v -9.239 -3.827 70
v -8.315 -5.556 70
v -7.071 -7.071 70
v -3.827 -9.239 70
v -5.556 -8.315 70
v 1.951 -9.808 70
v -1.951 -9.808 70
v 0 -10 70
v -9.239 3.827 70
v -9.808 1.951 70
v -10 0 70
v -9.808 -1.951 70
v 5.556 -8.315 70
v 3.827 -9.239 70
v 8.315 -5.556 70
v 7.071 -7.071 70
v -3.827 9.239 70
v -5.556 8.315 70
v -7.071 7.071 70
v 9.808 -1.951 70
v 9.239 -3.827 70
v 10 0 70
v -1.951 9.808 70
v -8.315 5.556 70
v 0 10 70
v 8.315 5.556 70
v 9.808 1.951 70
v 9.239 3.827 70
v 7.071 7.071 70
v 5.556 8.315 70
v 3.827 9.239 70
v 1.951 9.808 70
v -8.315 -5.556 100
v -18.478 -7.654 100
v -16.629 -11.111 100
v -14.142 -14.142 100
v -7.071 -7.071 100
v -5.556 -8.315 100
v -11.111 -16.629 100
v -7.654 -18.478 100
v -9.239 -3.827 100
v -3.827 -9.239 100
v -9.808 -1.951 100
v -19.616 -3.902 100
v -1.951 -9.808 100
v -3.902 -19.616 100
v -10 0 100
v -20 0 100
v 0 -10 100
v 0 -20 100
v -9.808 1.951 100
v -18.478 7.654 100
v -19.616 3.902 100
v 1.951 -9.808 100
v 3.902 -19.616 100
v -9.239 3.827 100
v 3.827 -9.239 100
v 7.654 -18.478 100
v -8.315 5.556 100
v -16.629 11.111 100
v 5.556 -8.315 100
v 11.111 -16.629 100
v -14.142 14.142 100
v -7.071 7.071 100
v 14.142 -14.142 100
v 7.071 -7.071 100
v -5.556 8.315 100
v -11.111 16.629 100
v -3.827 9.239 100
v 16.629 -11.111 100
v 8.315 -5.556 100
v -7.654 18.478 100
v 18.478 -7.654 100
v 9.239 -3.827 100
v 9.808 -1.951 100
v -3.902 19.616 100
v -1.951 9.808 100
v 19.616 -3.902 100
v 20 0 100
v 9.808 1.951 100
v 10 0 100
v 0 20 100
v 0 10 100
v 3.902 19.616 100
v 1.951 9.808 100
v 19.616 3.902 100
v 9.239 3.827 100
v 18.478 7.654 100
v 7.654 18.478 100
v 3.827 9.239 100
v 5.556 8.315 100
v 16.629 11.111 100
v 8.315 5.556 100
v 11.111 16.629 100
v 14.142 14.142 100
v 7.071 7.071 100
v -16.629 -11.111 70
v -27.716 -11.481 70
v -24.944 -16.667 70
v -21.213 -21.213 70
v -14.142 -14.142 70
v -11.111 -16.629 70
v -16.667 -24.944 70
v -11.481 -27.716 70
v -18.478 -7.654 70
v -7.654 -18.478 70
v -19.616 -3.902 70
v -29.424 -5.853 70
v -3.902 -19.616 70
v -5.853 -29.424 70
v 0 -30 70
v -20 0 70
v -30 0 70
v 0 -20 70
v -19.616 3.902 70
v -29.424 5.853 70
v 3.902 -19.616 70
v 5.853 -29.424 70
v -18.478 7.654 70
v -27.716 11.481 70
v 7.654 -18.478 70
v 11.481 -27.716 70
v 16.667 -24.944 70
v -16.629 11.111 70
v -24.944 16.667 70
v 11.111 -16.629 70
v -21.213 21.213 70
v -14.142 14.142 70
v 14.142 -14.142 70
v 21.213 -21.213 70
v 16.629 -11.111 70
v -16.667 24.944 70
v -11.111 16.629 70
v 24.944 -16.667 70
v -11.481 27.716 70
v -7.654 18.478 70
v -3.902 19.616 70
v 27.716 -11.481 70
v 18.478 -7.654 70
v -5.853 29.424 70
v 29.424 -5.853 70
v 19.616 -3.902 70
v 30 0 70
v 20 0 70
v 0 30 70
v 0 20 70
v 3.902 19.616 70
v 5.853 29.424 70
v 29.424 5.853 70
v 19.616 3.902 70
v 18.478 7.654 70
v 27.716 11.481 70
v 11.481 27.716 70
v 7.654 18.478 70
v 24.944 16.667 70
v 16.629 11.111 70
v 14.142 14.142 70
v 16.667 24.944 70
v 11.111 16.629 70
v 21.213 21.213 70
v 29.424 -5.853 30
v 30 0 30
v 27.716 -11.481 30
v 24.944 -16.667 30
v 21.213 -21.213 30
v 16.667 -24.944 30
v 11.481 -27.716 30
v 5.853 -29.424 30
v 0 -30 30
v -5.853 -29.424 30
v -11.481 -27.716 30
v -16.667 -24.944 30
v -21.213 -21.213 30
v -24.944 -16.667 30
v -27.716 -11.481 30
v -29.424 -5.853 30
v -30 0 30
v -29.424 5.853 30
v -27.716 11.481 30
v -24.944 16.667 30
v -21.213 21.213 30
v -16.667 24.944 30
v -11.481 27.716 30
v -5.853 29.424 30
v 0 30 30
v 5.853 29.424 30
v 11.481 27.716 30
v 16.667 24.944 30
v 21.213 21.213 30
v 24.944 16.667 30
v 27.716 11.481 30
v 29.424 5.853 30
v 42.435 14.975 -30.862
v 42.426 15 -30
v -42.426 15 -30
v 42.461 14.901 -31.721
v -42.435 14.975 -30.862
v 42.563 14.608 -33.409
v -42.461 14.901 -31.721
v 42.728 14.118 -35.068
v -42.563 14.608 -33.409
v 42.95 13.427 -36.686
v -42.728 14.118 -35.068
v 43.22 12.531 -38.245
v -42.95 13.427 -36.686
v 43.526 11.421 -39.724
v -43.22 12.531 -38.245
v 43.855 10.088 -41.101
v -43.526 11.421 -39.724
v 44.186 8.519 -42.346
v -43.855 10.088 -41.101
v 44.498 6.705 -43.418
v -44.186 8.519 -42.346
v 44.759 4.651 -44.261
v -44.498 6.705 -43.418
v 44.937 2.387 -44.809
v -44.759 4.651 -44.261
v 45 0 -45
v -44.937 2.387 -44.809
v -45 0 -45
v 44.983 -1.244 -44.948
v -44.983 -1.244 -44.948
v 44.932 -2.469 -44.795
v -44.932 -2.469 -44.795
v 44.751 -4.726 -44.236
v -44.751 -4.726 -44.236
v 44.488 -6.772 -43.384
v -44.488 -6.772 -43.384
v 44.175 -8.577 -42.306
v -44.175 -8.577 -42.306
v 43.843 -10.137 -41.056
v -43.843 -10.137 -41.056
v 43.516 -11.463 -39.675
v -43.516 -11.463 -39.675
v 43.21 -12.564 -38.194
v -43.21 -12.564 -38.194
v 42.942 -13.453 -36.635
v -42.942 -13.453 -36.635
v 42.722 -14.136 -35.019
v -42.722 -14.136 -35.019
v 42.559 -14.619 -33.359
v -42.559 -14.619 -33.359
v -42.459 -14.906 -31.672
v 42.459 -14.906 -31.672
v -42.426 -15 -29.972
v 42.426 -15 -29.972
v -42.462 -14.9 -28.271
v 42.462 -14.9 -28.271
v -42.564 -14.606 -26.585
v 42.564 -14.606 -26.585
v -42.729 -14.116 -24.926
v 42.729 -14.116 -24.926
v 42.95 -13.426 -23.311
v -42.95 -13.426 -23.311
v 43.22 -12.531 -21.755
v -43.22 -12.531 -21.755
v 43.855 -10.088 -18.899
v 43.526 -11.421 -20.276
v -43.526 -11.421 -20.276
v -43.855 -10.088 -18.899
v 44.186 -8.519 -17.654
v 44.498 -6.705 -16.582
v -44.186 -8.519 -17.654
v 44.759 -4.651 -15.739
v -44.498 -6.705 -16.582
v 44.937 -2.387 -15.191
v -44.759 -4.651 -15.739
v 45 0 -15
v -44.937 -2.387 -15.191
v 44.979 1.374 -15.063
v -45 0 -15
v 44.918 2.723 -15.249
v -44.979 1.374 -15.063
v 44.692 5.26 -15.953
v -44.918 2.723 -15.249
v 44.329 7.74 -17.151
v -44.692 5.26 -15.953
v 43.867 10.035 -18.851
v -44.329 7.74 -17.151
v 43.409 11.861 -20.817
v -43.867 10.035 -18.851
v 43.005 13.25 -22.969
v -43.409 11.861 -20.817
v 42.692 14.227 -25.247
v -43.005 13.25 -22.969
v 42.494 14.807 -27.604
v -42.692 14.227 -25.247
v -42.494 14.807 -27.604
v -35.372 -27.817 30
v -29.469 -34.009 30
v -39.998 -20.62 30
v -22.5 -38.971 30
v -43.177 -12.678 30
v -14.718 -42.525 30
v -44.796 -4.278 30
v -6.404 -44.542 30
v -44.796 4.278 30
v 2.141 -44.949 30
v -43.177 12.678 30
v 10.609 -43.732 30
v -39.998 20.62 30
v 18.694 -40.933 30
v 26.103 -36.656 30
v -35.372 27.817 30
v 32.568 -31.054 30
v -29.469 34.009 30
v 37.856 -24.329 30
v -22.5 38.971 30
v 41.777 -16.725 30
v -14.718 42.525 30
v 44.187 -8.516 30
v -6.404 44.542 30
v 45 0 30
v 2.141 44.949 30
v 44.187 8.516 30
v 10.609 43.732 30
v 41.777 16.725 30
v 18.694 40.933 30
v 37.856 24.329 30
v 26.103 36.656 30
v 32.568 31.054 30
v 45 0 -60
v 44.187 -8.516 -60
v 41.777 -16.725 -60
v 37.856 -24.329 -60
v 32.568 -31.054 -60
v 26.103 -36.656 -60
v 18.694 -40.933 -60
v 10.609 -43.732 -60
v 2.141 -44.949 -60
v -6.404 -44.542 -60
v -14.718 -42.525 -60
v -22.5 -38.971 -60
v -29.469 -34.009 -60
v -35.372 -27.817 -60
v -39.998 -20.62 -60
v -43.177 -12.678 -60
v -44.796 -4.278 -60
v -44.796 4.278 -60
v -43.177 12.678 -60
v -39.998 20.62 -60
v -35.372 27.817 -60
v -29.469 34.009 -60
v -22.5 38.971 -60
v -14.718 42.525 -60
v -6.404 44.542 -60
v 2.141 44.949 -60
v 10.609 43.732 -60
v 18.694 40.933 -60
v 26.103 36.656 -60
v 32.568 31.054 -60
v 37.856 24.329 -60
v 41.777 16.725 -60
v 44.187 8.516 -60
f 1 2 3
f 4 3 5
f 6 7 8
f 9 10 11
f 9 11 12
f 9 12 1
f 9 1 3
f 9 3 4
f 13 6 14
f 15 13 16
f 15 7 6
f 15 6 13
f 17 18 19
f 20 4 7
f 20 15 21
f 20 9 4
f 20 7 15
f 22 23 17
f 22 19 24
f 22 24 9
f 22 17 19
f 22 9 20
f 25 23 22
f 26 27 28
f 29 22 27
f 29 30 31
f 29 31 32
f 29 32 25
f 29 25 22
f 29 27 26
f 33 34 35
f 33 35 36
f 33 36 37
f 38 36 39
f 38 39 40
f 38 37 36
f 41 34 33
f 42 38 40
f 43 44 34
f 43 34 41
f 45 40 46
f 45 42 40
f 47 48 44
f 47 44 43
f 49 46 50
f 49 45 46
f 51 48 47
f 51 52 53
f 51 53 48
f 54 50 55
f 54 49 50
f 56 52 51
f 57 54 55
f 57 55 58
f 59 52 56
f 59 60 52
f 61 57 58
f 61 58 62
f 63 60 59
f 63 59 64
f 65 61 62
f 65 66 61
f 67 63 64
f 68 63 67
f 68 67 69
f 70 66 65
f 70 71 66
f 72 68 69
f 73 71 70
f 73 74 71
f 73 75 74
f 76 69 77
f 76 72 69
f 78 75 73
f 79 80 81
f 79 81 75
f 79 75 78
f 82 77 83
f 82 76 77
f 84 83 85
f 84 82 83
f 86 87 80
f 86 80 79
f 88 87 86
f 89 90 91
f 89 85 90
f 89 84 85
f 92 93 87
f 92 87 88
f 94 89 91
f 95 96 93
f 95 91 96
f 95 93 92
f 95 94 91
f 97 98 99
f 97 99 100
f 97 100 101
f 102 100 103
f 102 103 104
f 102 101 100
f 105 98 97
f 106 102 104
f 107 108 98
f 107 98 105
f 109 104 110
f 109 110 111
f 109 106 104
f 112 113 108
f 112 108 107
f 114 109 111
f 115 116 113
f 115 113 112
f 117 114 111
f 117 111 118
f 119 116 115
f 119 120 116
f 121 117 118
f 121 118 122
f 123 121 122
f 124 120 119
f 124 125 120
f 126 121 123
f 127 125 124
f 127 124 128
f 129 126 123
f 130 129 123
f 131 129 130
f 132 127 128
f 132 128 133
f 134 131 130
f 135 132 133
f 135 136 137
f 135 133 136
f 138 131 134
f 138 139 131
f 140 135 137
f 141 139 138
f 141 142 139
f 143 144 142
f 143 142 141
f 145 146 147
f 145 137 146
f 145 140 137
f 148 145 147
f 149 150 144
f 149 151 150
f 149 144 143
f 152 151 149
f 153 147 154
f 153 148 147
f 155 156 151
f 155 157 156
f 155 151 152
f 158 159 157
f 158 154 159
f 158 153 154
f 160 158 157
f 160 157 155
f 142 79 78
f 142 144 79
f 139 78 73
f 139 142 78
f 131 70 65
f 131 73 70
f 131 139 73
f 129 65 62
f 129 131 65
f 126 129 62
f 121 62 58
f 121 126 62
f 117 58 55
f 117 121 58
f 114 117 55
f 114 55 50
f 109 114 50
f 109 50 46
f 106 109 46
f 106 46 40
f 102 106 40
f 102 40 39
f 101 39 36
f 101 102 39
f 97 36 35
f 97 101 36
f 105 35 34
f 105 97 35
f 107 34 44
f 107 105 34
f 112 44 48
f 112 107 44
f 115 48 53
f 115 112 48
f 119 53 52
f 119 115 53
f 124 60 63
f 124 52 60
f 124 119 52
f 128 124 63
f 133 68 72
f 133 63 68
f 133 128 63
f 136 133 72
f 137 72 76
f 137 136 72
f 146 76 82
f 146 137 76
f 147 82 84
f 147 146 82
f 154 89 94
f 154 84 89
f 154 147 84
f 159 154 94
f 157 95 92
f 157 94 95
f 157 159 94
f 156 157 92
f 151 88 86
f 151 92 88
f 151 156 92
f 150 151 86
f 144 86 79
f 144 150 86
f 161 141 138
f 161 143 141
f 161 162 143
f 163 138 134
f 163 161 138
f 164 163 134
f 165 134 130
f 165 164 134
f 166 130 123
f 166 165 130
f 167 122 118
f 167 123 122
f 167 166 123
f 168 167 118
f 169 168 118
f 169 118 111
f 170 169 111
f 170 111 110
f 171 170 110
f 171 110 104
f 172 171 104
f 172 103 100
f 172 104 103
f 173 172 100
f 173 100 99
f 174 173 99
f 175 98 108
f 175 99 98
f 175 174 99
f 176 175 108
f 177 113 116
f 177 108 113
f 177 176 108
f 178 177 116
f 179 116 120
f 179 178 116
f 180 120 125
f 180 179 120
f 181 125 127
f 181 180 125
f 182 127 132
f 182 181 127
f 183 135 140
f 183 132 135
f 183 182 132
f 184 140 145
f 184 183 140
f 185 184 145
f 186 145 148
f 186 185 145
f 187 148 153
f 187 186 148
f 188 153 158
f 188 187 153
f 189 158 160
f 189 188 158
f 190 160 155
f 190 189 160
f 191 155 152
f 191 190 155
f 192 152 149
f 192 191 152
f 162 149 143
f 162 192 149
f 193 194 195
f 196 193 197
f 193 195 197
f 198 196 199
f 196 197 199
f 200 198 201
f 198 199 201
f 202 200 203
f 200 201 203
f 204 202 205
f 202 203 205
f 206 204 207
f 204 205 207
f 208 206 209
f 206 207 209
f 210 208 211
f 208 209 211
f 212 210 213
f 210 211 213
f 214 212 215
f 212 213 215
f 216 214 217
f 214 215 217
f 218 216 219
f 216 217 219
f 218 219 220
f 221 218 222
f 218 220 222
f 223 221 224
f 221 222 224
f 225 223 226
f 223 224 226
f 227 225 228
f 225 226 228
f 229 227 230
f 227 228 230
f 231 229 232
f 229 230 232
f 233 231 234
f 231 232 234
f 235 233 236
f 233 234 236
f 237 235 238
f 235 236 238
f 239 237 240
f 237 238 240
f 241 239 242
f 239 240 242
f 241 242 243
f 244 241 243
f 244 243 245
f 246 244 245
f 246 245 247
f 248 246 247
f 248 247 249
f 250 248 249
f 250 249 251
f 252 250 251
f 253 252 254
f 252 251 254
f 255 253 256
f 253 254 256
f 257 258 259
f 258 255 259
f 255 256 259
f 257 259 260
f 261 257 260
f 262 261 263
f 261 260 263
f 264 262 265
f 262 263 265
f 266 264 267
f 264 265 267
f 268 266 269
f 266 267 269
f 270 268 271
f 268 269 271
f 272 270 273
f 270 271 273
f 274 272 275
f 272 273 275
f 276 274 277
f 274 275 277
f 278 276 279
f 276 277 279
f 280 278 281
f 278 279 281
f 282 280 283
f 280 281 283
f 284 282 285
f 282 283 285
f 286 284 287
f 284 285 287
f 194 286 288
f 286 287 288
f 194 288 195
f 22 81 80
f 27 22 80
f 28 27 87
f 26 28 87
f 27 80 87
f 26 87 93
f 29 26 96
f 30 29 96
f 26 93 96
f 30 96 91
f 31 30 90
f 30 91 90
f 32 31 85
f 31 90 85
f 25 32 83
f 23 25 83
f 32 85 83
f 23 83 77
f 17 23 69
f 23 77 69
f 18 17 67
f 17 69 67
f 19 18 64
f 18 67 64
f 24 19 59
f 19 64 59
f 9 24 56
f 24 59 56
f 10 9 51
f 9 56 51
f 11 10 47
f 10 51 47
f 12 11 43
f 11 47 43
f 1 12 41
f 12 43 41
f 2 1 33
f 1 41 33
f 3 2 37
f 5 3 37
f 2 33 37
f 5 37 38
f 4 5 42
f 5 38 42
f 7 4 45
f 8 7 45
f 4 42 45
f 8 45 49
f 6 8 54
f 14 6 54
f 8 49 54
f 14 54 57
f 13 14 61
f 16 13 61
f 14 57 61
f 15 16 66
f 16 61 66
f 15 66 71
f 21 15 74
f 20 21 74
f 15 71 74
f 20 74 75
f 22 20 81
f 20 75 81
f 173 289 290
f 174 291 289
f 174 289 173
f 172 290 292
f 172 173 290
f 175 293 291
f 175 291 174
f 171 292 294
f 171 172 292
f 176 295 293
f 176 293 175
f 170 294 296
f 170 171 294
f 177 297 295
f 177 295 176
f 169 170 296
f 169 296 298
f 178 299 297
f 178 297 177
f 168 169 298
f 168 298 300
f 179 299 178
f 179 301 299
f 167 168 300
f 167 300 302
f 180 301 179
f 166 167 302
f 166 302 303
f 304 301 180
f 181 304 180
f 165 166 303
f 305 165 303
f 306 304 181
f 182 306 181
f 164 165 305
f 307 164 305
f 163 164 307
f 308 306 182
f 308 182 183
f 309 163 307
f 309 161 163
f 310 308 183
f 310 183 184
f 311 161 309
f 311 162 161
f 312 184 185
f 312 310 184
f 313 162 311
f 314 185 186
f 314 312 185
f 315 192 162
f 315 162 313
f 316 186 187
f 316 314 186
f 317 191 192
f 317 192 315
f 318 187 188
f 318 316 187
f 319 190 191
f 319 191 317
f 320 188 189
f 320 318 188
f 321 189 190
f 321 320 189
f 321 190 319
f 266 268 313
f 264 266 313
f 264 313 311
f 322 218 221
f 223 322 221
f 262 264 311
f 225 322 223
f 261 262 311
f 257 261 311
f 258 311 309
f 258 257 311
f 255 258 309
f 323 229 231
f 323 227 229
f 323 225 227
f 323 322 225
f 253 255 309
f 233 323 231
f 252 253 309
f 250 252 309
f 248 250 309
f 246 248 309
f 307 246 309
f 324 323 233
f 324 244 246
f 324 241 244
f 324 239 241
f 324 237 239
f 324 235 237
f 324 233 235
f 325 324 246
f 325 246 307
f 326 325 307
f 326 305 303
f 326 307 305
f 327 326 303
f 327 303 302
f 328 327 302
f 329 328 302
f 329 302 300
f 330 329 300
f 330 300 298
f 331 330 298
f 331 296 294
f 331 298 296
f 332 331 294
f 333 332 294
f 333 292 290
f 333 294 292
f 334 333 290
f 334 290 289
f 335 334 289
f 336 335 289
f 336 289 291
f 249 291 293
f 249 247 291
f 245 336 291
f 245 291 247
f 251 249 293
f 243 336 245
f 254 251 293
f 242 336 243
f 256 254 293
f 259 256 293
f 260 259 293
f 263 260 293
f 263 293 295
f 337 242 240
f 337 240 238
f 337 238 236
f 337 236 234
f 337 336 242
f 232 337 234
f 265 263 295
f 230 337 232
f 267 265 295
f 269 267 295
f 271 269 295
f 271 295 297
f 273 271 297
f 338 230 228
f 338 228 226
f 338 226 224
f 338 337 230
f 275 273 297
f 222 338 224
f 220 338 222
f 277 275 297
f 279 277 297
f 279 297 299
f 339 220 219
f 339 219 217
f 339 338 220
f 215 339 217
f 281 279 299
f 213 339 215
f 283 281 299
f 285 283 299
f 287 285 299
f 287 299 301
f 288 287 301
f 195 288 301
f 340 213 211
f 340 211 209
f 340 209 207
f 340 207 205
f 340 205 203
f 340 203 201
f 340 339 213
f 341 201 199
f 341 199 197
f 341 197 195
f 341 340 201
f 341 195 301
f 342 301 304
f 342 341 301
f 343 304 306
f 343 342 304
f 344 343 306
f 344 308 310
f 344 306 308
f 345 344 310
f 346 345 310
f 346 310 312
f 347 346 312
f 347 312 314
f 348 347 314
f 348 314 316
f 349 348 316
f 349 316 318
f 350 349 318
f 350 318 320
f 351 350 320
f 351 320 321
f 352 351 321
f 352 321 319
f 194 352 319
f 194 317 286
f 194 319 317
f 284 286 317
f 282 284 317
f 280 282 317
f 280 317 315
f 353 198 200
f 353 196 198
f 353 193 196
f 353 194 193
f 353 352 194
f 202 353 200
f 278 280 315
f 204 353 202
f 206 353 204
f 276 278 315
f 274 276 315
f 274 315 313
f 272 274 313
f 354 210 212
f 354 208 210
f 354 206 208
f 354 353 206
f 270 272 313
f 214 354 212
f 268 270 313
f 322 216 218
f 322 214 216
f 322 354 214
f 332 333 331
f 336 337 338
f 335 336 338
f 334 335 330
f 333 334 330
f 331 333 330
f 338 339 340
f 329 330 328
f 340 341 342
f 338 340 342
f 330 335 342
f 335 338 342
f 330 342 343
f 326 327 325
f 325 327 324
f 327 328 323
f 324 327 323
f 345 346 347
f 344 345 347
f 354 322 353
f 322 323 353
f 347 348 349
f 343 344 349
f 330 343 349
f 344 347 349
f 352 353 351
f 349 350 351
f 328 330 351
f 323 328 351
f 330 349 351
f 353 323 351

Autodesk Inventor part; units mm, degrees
ref_plane "XZ Plane" through (0, 0, 0) normal (0, 1, 0) x (-1, 0, 0)
sketch "Sketch1" plane through (0, 0, 0) normal (0, 0, 1) x (1, 0, 0)
  circle A0 centre (0, 0) radius 45
  dimension "d0" = 90
extrude "Extrusion1" add sketch "Sketch1" along normal blind 30 and the other way blind 60
sketch "Sketch2" plane through (0, 0, 30) normal (0, 0, 1) x (1, 0, 0)
  circle A0 centre (0, 0) radius 45 projected
  circle A1 centre (0, 0) radius 30
  dimension "d3" = 60
extrude "Extrusion2" add sketch "Sketch2" along normal blind 40 contours A1
sketch "Sketch3" plane through (0, 0, 70) normal (0, 0, 1) x (1, 0, 0)
  circle A0 centre (0, 0) radius 30 projected
  circle A1 centre (0, 0) radius 20
  dimension "d6" = 40
extrude "Extrusion3" add sketch "Sketch3" along normal blind 30 contours A1
sketch "Sketch4" plane through (0, 0, 100) normal (0, 0, 1) x (1, 0, 0)
  circle A0 centre (0, 0) radius 10
  dimension "d9" = 20
extrude "Extrusion4" cut sketch "Sketch4" against normal blind 30
ref_plane "Work Plane1" through (-45, 0, 0) normal (1, 0, 0) x (0, 1, 0)
sketch "Sketch5" plane through (-45, 0, 0) normal (1, 0, 0) x (0, 1, 0)
  point P0 (0, 0)
sketch "Sketch6" plane through (0, 0, 0) normal (1, 0, 0) x (0, 1, 0)
  point P0 (0, 0)
  point P1 (45, 0)
  point P2 (-45, 0)
  point P3 (-30, 0)
  point P4 (30, 0)
ref_plane "Work Plane2" through (-45, 0, 0) normal (1, 0, 0) x (0, 1, 0)
sketch "Sketch7" plane through (-45, 0, 0) normal (1, 0, 0) x (0, 1, 0)
  line L0 (-45, -60) -> (45, -60) projected
  circle A0 centre (0, -30) radius 15
  point P0 (0, 0)
  dimension "d25" = 30
extrude "Extrusion5" cut sketch "Sketch7" along normal through all
sketch "Sketch8" plane through (0, 0, -60) normal (0, 0, -1) x (-1, 0, 0)
  point P0 (0, 0)
properties part number "cad@57"
